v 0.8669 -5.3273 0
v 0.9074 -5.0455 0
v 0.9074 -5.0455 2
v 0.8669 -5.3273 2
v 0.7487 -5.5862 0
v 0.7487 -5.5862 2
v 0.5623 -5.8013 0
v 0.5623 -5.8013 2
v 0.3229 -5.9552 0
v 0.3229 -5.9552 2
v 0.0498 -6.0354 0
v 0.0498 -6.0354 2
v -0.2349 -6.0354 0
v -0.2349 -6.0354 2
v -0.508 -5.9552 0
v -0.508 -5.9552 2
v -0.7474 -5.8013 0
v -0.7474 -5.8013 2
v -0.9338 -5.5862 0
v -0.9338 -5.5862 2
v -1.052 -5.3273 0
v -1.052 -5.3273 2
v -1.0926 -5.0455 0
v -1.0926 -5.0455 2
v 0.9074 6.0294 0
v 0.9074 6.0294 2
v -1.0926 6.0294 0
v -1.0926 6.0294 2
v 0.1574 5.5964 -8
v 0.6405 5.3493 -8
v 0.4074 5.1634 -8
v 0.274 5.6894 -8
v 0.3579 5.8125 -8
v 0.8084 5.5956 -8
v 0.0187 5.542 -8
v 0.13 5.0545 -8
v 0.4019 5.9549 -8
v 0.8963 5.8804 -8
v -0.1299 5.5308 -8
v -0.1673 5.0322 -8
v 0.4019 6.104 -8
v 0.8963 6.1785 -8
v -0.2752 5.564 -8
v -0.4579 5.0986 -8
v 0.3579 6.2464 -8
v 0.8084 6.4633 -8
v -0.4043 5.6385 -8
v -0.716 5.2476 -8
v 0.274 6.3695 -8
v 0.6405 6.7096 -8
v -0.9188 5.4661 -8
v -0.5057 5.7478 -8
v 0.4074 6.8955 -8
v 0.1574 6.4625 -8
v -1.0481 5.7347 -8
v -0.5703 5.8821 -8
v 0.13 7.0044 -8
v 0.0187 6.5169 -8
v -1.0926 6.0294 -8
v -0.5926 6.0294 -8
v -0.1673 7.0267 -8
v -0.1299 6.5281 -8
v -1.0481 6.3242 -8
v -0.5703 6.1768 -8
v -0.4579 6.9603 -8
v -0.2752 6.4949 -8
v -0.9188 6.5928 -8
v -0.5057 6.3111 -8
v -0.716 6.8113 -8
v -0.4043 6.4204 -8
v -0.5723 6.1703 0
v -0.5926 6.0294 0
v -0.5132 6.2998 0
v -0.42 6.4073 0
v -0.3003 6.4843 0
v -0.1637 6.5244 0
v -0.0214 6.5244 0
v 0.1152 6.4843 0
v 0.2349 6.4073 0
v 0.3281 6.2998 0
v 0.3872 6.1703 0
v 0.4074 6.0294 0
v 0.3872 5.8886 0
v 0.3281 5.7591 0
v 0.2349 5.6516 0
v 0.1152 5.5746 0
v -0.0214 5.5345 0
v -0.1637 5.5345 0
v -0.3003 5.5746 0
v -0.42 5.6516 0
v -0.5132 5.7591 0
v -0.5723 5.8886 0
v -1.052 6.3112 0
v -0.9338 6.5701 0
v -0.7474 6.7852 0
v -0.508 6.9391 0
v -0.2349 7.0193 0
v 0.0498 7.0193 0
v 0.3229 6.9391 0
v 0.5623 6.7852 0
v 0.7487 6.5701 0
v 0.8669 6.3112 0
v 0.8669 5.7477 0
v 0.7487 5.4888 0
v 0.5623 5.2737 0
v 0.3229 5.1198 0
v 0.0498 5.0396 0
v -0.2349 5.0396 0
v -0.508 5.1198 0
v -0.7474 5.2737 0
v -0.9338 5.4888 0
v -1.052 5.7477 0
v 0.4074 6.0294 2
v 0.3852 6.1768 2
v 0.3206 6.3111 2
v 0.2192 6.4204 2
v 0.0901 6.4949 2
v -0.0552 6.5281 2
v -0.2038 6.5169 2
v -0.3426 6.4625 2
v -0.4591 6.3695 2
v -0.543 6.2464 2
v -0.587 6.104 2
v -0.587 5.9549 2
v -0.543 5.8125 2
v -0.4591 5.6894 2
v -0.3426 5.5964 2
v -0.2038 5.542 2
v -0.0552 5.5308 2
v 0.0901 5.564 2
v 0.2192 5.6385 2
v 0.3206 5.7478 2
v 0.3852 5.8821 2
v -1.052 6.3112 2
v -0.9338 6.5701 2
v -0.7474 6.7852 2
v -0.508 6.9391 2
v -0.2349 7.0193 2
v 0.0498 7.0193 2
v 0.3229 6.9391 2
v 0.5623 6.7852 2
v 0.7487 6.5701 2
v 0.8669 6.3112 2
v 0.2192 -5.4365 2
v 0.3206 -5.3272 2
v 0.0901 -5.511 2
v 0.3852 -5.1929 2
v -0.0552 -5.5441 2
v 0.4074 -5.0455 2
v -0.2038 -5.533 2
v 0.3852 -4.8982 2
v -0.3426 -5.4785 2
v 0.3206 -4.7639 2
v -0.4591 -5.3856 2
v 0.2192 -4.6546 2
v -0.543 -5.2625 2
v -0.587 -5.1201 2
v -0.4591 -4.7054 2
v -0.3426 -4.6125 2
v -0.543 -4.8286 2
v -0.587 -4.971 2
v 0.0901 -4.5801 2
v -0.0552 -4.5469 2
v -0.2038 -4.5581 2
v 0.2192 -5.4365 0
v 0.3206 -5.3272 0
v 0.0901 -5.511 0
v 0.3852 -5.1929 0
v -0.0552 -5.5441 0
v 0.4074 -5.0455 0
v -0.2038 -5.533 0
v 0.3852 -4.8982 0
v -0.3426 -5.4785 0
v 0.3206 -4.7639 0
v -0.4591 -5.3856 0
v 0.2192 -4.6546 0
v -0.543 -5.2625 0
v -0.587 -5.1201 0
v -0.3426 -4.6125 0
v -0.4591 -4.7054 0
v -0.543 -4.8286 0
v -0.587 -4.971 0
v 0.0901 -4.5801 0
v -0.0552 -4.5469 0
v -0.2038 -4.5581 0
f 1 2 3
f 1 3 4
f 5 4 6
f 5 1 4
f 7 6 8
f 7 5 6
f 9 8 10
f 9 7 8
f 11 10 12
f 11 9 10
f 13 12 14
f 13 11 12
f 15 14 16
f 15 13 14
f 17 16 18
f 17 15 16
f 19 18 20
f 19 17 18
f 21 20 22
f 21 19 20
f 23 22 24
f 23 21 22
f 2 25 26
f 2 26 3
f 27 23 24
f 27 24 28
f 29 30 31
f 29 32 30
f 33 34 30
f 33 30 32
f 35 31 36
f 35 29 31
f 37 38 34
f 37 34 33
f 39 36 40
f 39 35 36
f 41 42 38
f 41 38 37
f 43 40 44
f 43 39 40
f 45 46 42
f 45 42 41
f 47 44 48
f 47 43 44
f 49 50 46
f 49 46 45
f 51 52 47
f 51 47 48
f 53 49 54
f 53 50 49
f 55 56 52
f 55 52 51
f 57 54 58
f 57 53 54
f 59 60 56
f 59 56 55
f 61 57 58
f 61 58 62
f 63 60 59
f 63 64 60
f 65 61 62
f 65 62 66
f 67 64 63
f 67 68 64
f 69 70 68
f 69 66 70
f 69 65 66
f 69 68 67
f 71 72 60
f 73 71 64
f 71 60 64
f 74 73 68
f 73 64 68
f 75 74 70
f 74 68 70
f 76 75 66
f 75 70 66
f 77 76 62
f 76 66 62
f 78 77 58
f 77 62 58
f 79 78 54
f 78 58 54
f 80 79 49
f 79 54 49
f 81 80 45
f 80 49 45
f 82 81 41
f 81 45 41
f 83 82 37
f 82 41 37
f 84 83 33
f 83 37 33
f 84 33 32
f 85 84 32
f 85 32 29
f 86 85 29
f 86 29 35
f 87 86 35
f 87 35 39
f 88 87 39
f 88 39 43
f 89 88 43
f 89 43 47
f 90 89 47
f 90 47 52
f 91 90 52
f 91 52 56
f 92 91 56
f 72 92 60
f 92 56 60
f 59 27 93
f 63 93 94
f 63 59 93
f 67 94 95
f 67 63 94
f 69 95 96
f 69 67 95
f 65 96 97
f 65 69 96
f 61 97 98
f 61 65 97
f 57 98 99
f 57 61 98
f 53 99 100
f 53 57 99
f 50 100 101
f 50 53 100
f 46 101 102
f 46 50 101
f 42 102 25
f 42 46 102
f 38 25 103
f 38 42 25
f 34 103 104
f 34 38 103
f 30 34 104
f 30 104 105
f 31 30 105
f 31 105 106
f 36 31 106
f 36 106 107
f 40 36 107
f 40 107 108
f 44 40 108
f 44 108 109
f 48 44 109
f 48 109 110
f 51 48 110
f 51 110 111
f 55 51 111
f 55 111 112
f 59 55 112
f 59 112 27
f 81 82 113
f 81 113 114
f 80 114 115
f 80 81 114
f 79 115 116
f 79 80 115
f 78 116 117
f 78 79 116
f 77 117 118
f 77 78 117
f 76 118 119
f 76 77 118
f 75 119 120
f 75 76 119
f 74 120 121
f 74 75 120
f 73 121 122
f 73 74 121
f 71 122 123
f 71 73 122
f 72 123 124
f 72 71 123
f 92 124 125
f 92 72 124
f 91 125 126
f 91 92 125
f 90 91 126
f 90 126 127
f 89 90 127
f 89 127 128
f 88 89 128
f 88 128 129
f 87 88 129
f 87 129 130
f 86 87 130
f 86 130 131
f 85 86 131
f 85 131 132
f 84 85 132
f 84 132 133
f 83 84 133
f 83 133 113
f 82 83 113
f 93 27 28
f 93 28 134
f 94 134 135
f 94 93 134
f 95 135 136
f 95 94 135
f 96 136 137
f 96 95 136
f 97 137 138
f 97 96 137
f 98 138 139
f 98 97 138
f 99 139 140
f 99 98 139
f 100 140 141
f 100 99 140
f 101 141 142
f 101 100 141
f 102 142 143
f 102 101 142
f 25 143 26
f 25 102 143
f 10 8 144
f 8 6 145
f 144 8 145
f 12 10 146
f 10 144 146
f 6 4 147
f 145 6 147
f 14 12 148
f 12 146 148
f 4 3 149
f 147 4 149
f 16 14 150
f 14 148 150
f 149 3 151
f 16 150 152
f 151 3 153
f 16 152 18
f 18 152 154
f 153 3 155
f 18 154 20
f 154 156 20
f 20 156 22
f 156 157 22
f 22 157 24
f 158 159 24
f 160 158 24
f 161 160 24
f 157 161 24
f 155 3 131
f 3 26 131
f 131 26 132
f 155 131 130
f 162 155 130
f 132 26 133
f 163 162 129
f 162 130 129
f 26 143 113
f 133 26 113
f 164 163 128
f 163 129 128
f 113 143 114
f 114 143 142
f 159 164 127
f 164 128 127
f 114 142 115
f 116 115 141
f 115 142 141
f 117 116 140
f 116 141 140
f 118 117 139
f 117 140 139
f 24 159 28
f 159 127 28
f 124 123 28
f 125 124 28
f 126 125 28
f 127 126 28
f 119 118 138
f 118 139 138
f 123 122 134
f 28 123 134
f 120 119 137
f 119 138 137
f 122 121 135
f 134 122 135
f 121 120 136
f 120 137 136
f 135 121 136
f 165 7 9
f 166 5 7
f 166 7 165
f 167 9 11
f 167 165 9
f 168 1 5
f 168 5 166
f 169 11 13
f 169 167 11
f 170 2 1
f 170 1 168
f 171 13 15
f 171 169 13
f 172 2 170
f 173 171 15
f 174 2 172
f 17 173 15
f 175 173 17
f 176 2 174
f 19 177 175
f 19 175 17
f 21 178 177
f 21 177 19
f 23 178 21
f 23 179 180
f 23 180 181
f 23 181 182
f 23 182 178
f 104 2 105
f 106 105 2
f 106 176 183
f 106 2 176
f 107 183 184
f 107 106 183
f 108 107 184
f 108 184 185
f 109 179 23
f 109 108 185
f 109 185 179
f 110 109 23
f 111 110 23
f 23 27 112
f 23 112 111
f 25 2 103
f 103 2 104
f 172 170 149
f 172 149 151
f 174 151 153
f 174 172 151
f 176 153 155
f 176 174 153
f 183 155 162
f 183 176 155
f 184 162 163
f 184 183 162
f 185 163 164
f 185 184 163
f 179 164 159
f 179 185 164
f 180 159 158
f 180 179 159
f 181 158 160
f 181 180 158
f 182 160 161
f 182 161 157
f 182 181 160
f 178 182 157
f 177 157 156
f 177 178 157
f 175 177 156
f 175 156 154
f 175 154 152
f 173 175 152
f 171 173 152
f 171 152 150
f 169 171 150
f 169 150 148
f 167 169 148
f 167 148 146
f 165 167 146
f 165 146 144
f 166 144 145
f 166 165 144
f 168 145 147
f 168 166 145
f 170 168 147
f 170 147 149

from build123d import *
from build123d.topology import SkipClean

# Parameters (mm, degrees)
SKETCH_1_R      = 0.5
EXTRUDE_1_DEPTH = 2
EXTRUDE_START   = 8
SKETCH_3_R      = 1
SKETCH_3_R_2    = 0.5
EXTRUDE_3_DEPTH = 8


with BuildPart() as part:
    # 草图1 → 凸台-拉伸1 (new body)
    with BuildSketch(Plane.XY):
        with BuildLine():
            Line((-1.092551508, -5.045535568), (-1.092551508, 6.029448207))
            ThreePointArc((-1.092551508, 6.029448207), (-0.092551508, 7.029448207), (0.907448492, 6.029448207))
            Line((0.907448492, 6.029448207), (0.907448492, -5.045535417))
            ThreePointArc((0.907448492, -5.045535417), (-0.092551432, -6.045535568), (-1.092551508, -5.045535568))
        make_face()
        with Locations((-0.092551508, -5.045535568)):
            Circle(SKETCH_1_R, mode=Mode.SUBTRACT)
        with Locations((-0.092551508, 6.029448207)):
            Circle(SKETCH_1_R, mode=Mode.SUBTRACT)
    extrude(amount=EXTRUDE_1_DEPTH)

    # 草图3 → 凸台-拉伸3 (add)
    with SkipClean():  # the faces are left unmerged after this step: merging them gives an invalid solid
        with BuildSketch(Plane(origin=(0, 0, 0), x_dir=(-1, 0, 0), z_dir=(0, 0, -1)).offset(EXTRUDE_START)):
            with Locations((0.092551508, 6.029448207)):
                Circle(SKETCH_3_R)
            with Locations((0.092551508, 6.029448207)):
                Circle(SKETCH_3_R_2, mode=Mode.SUBTRACT)
        extrude(amount=-EXTRUDE_3_DEPTH)


solid = part.part
